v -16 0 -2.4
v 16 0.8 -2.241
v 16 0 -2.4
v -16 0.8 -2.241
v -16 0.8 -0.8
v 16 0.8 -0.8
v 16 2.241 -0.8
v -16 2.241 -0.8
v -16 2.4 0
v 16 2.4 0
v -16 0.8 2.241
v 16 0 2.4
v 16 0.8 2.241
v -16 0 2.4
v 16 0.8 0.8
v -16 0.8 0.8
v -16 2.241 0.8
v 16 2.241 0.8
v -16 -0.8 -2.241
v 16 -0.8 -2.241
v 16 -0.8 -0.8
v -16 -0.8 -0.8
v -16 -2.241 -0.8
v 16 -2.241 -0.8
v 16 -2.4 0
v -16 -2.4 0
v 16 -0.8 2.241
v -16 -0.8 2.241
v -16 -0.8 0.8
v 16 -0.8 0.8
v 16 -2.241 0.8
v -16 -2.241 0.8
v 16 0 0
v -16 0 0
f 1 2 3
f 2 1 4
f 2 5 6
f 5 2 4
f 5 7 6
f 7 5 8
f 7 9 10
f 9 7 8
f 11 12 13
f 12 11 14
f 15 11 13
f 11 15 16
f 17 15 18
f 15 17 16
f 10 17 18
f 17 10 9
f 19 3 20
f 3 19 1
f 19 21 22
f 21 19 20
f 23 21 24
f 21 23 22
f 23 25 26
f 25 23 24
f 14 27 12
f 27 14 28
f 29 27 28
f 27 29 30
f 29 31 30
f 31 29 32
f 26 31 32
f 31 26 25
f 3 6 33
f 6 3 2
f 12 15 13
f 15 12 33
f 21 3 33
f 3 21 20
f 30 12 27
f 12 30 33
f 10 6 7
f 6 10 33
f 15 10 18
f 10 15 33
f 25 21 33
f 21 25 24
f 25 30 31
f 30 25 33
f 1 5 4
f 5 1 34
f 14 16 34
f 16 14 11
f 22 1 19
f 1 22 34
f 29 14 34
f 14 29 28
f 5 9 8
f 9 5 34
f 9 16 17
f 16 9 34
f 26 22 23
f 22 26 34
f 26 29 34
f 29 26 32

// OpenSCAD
// file: ../p/axle.scad
use <../lib.scad>
function ldraw_lib__axle() = [
// 0 Axle
// 0 Name: axle.dat
// 0 Author: James Jessiman
// 0 !LDRAW_ORG Primitive UPDATE 2003-01
// 0 !LICENSE Licensed under CC BY 4.0 : see CAreadme.txt
// 
// 0 BFC CERTIFY CCW
  [0,"BFC","CERTIFY"],
  [0,"BFC","CCW"],
// 
// 0 !HISTORY 2000-04-23 [sbliss] Added conditional edges along outermost diameters
// 0 !HISTORY 2000-05-07 [PTadmin] Official Update 2000-01
// 0 !HISTORY 2002-11-08 [OrionP] Adjusted fit and precision
// 0 !HISTORY 2003-03-12 [PTadmin] Official Update 2003-01
// 0 !HISTORY 2007-06-24 [PTadmin] Header formatted for Contributor Agreement
// 0 !HISTORY 2008-07-01 [PTadmin] Official Update 2008-01
// 
// 
// 5 24 6 0 0 6 1 0 5.602 0 2 5.602 0 -2
  [5,24,6,0,0,6,1,0,5.602,0,2,5.602,0,-2],
// 5 24 0 0 6 0 1 6 2 0 5.602 -2 0 5.602
  [5,24,0,0,6,0,1,6,2,0,5.602,-2,0,5.602],
// 5 24 -6 0 0 -6 1 0 -5.602 0 -2 -5.602 0 2
  [5,24,-6,0,0,-6,1,0,-5.602,0,-2,-5.602,0,2],
// 5 24 0 0 -6 0 1 -6 -2 0 -5.602 2 0 -5.602
  [5,24,0,0,-6,0,1,-6,-2,0,-5.602,2,0,-5.602],
// 
// 2 24 6 0 0 5.602 0 2
  [2,24,6,0,0,5.602,0,2],
// 2 24 5.602 0 2 2 0 2
  [2,24,5.602,0,2,2,0,2],
// 2 24 2 0 2 2 0 5.602
  [2,24,2,0,2,2,0,5.602],
// 2 24 2 0 5.602 0 0 6
  [2,24,2,0,5.602,0,0,6],
// 2 24 -6 0 0 -5.602 0 2
  [2,24,-6,0,0,-5.602,0,2],
// 2 24 -5.602 0 2 -2 0 2
  [2,24,-5.602,0,2,-2,0,2],
// 2 24 -2 0 2 -2 0 5.602
  [2,24,-2,0,2,-2,0,5.602],
// 2 24 -2 0 5.602 -0 0 6
  [2,24,-2,0,5.602,-0,0,6],
// 2 24 6 0 -0 5.602 0 -2
  [2,24,6,0,-0,5.602,0,-2],
// 2 24 5.602 0 -2 2 0 -2
  [2,24,5.602,0,-2,2,0,-2],
// 2 24 2 0 -2 2 0 -5.602
  [2,24,2,0,-2,2,0,-5.602],
// 2 24 2 0 -5.602 0 0 -6
  [2,24,2,0,-5.602,0,0,-6],
// 2 24 -6 0 -0 -5.602 0 -2
  [2,24,-6,0,-0,-5.602,0,-2],
// 2 24 -5.602 0 -2 -2 0 -2
  [2,24,-5.602,0,-2,-2,0,-2],
// 2 24 -2 0 -2 -2 0 -5.602
  [2,24,-2,0,-2,-2,0,-5.602],
// 2 24 -2 0 -5.602 -0 0 -6
  [2,24,-2,0,-5.602,-0,0,-6],
// 2 24 6 1 0 5.602 1 2
  [2,24,6,1,0,5.602,1,2],
// 2 24 5.602 1 2 2 1 2
  [2,24,5.602,1,2,2,1,2],
// 2 24 2 1 2 2 1 5.602
  [2,24,2,1,2,2,1,5.602],
// 2 24 2 1 5.602 0 1 6
  [2,24,2,1,5.602,0,1,6],
// 2 24 -6 1 0 -5.602 1 2
  [2,24,-6,1,0,-5.602,1,2],
// 2 24 -5.602 1 2 -2 1 2
  [2,24,-5.602,1,2,-2,1,2],
// 2 24 -2 1 2 -2 1 5.602
  [2,24,-2,1,2,-2,1,5.602],
// 2 24 -2 1 5.602 -0 1 6
  [2,24,-2,1,5.602,-0,1,6],
// 2 24 6 1 -0 5.602 1 -2
  [2,24,6,1,-0,5.602,1,-2],
// 2 24 5.602 1 -2 2 1 -2
  [2,24,5.602,1,-2,2,1,-2],
// 2 24 2 1 -2 2 1 -5.602
  [2,24,2,1,-2,2,1,-5.602],
// 2 24 2 1 -5.602 0 1 -6
  [2,24,2,1,-5.602,0,1,-6],
// 2 24 -6 1 -0 -5.602 1 -2
  [2,24,-6,1,-0,-5.602,1,-2],
// 2 24 -5.602 1 -2 -2 1 -2
  [2,24,-5.602,1,-2,-2,1,-2],
// 2 24 -2 1 -2 -2 1 -5.602
  [2,24,-2,1,-2,-2,1,-5.602],
// 2 24 -2 1 -5.602 -0 1 -6
  [2,24,-2,1,-5.602,-0,1,-6],
// 
// 2 24 5.602 0 2 5.602 1 2
  [2,24,5.602,0,2,5.602,1,2],
// 2 24 2 0 2 2 1 2
  [2,24,2,0,2,2,1,2],
// 2 24 2 0 5.602 2 1 5.602
  [2,24,2,0,5.602,2,1,5.602],
// 2 24 -5.602 0 2 -5.602 1 2
  [2,24,-5.602,0,2,-5.602,1,2],
// 2 24 -2 0 2 -2 1 2
  [2,24,-2,0,2,-2,1,2],
// 2 24 -2 0 5.602 -2 1 5.602
  [2,24,-2,0,5.602,-2,1,5.602],
// 2 24 5.602 0 -2 5.602 1 -2
  [2,24,5.602,0,-2,5.602,1,-2],
// 2 24 2 0 -2 2 1 -2
  [2,24,2,0,-2,2,1,-2],
// 2 24 2 0 -5.602 2 1 -5.602
  [2,24,2,0,-5.602,2,1,-5.602],
// 2 24 -5.602 0 -2 -5.602 1 -2
  [2,24,-5.602,0,-2,-5.602,1,-2],
// 2 24 -2 0 -2 -2 1 -2
  [2,24,-2,0,-2,-2,1,-2],
// 2 24 -2 0 -5.602 -2 1 -5.602
  [2,24,-2,0,-5.602,-2,1,-5.602],
// 
// 4 16 6 0 0 6 1 0 5.602 1 2 5.602 0 2
  [4,16,6,0,0,6,1,0,5.602,1,2,5.602,0,2],
// 4 16 5.602 0 2 5.602 1 2 2 1 2 2 0 2
  [4,16,5.602,0,2,5.602,1,2,2,1,2,2,0,2],
// 4 16 2 0 2 2 1 2 2 1 5.602 2 0 5.602
  [4,16,2,0,2,2,1,2,2,1,5.602,2,0,5.602],
// 4 16 2 0 5.602 2 1 5.602 0 1 6 0 0 6
  [4,16,2,0,5.602,2,1,5.602,0,1,6,0,0,6],
// 4 16 -6 0 0 -5.602 0 2 -5.602 1 2 -6 1 0
  [4,16,-6,0,0,-5.602,0,2,-5.602,1,2,-6,1,0],
// 4 16 -5.602 0 2 -2 0 2 -2 1 2 -5.602 1 2
  [4,16,-5.602,0,2,-2,0,2,-2,1,2,-5.602,1,2],
// 4 16 -2 0 2 -2 0 5.602 -2 1 5.602 -2 1 2
  [4,16,-2,0,2,-2,0,5.602,-2,1,5.602,-2,1,2],
// 4 16 -2 0 5.602 -0 0 6 -0 1 6 -2 1 5.602
  [4,16,-2,0,5.602,-0,0,6,-0,1,6,-2,1,5.602],
// 4 16 6 0 -0 5.602 0 -2 5.602 1 -2 6 1 -0
  [4,16,6,0,-0,5.602,0,-2,5.602,1,-2,6,1,-0],
// 4 16 5.602 0 -2 2 0 -2 2 1 -2 5.602 1 -2
  [4,16,5.602,0,-2,2,0,-2,2,1,-2,5.602,1,-2],
// 4 16 2 0 -2 2 0 -5.602 2 1 -5.602 2 1 -2
  [4,16,2,0,-2,2,0,-5.602,2,1,-5.602,2,1,-2],
// 4 16 2 0 -5.602 0 0 -6 0 1 -6 2 1 -5.602
  [4,16,2,0,-5.602,0,0,-6,0,1,-6,2,1,-5.602],
// 4 16 -6 0 -0 -6 1 -0 -5.602 1 -2 -5.602 0 -2
  [4,16,-6,0,-0,-6,1,-0,-5.602,1,-2,-5.602,0,-2],
// 4 16 -5.602 0 -2 -5.602 1 -2 -2 1 -2 -2 0 -2
  [4,16,-5.602,0,-2,-5.602,1,-2,-2,1,-2,-2,0,-2],
// 4 16 -2 0 -2 -2 1 -2 -2 1 -5.602 -2 0 -5.602
  [4,16,-2,0,-2,-2,1,-2,-2,1,-5.602,-2,0,-5.602],
// 4 16 -2 0 -5.602 -2 1 -5.602 -0 1 -6 -0 0 -6
  [4,16,-2,0,-5.602,-2,1,-5.602,-0,1,-6,-0,0,-6],
// 
// 4 16 6 0 0 5.602 0 2 2 0 2 0 0 0
  [4,16,6,0,0,5.602,0,2,2,0,2,0,0,0],
// 4 16 -6 0 0 0 0 0 -2 0 2 -5.602 0 2
  [4,16,-6,0,0,0,0,0,-2,0,2,-5.602,0,2],
// 4 16 6 0 0 0 0 0 2 0 -2 5.602 0 -2
  [4,16,6,0,0,0,0,0,2,0,-2,5.602,0,-2],
// 4 16 -6 0 0 -5.602 0 -2 -2 0 -2 0 0 0
  [4,16,-6,0,0,-5.602,0,-2,-2,0,-2,0,0,0],
// 4 16 0 0 6 0 0 0 2 0 2 2 0 5.602
  [4,16,0,0,6,0,0,0,2,0,2,2,0,5.602],
// 4 16 0 0 6 -2 0 5.602 -2 0 2 0 0 0
  [4,16,0,0,6,-2,0,5.602,-2,0,2,0,0,0],
// 4 16 0 0 -6 2 0 -5.602 2 0 -2 0 0 0
  [4,16,0,0,-6,2,0,-5.602,2,0,-2,0,0,0],
// 4 16 0 0 -6 0 0 0 -2 0 -2 -2 0 -5.602
  [4,16,0,0,-6,0,0,0,-2,0,-2,-2,0,-5.602],
// 4 16 6 1 0 0 1 0 2 1 2 5.602 1 2
  [4,16,6,1,0,0,1,0,2,1,2,5.602,1,2],
// 4 16 -6 1 0 -5.602 1 2 -2 1 2 0 1 0
  [4,16,-6,1,0,-5.602,1,2,-2,1,2,0,1,0],
// 4 16 6 1 0 5.602 1 -2 2 1 -2 0 1 0
  [4,16,6,1,0,5.602,1,-2,2,1,-2,0,1,0],
// 4 16 -6 1 0 0 1 0 -2 1 -2 -5.602 1 -2
  [4,16,-6,1,0,0,1,0,-2,1,-2,-5.602,1,-2],
// 4 16 0 1 6 2 1 5.602 2 1 2 0 1 0
  [4,16,0,1,6,2,1,5.602,2,1,2,0,1,0],
// 4 16 0 1 6 0 1 0 -2 1 2 -2 1 5.602
  [4,16,0,1,6,0,1,0,-2,1,2,-2,1,5.602],
// 4 16 0 1 -6 0 1 0 2 1 -2 2 1 -5.602
  [4,16,0,1,-6,0,1,0,2,1,-2,2,1,-5.602],
// 4 16 0 1 -6 -2 1 -5.602 -2 1 -2 0 1 0
  [4,16,0,1,-6,-2,1,-5.602,-2,1,-2,0,1,0],
// 0
];
module ldraw_lib__axle(step=0, col=false, unit=2/5, alt=false, line=0.2, solid=!$preview)
    makepoly(ldraw_lib__axle(), step=step, col=col, unit=unit, alt=alt, line=line, solid=solid);
ldraw_lib__axle(line=0.2);
// file: 3705.scad
use <../lib.scad>
use <../p/axle.scad>
function ldraw_lib__3705() = [
// 0 Technic Axle  4
// 0 Name: 3705.dat
// 0 Author: James Jessiman
// 0 !LDRAW_ORG Part UPDATE 2005-01
// 0 !LICENSE Licensed under CC BY 2.0 and CC BY 4.0 : see CAreadme.txt
// 
// 0 BFC CERTIFY CCW
  [0,"BFC","CERTIFY"],
  [0,"BFC","CCW"],
// 
// 0 !HISTORY 2004-07-11 [guyvivan] BFC'ed
// 0 !HISTORY 2005-12-28 [PTadmin] Official Update 2005-01
// 0 !HISTORY 2007-06-29 [PTadmin] Header formatted for Contributor Agreement
// 0 !HISTORY 2008-07-01 [PTadmin] Official Update 2008-01
// 
// 
// 1 16 40 0 0 0 -80 0 1 0 0 0 0 1 axle.dat
  [1,16,40,0,0,0,-80,0,1,0,0,0,0,1, ldraw_lib__axle()],
// 0
// 
];
module ldraw_lib__3705(step=0, col=false, unit=2/5, alt=false, line=0.2, solid=!$preview)
    makepoly(ldraw_lib__3705(), step=step, col=col, unit=unit, alt=alt, line=line, solid=solid);
ldraw_lib__3705(line=0.2);
// main file
use <../lib.scad>
use <3705.scad>
function ldraw_lib__370526() = [
// 0 ~_Technic Axle  4 Black (Obsolete)
// 0 Name: 370526.dat
// 0 Author: Michael Heidemann [mikeheide]
// 0 !LDRAW_ORG Part Physical_Colour UPDATE 2019-02
// 0 !LICENSE Licensed under CC BY 4.0 : see CAreadme.txt
// 
// 0 BFC CERTIFY CCW
  [0,"BFC","CERTIFY"],
  [0,"BFC","CCW"],
// 
// 0 !HISTORY 2010-12-31 [PTadmin] Official Update 2010-03
// 0 !HISTORY 2019-07-22 [Holly-Wood] Obsoleted per decision not to include physical colour parts
// 0 !HISTORY 2019-09-09 [PTadmin] Official Update 2019-02
// 
// 
// 1 0 0 0 0 1 0 0 0 1 0 0 0 1 3705.dat
  [1,0,0,0,0,1,0,0,0,1,0,0,0,1, ldraw_lib__3705()],
];
module ldraw_lib__370526(step=0, col=false, unit=2/5, alt=false, line=0.2, solid=!$preview)
    makepoly(ldraw_lib__370526(), step=step, col=col, unit=unit, alt=alt, line=line, solid=solid);
ldraw_lib__370526(line=0.2);
